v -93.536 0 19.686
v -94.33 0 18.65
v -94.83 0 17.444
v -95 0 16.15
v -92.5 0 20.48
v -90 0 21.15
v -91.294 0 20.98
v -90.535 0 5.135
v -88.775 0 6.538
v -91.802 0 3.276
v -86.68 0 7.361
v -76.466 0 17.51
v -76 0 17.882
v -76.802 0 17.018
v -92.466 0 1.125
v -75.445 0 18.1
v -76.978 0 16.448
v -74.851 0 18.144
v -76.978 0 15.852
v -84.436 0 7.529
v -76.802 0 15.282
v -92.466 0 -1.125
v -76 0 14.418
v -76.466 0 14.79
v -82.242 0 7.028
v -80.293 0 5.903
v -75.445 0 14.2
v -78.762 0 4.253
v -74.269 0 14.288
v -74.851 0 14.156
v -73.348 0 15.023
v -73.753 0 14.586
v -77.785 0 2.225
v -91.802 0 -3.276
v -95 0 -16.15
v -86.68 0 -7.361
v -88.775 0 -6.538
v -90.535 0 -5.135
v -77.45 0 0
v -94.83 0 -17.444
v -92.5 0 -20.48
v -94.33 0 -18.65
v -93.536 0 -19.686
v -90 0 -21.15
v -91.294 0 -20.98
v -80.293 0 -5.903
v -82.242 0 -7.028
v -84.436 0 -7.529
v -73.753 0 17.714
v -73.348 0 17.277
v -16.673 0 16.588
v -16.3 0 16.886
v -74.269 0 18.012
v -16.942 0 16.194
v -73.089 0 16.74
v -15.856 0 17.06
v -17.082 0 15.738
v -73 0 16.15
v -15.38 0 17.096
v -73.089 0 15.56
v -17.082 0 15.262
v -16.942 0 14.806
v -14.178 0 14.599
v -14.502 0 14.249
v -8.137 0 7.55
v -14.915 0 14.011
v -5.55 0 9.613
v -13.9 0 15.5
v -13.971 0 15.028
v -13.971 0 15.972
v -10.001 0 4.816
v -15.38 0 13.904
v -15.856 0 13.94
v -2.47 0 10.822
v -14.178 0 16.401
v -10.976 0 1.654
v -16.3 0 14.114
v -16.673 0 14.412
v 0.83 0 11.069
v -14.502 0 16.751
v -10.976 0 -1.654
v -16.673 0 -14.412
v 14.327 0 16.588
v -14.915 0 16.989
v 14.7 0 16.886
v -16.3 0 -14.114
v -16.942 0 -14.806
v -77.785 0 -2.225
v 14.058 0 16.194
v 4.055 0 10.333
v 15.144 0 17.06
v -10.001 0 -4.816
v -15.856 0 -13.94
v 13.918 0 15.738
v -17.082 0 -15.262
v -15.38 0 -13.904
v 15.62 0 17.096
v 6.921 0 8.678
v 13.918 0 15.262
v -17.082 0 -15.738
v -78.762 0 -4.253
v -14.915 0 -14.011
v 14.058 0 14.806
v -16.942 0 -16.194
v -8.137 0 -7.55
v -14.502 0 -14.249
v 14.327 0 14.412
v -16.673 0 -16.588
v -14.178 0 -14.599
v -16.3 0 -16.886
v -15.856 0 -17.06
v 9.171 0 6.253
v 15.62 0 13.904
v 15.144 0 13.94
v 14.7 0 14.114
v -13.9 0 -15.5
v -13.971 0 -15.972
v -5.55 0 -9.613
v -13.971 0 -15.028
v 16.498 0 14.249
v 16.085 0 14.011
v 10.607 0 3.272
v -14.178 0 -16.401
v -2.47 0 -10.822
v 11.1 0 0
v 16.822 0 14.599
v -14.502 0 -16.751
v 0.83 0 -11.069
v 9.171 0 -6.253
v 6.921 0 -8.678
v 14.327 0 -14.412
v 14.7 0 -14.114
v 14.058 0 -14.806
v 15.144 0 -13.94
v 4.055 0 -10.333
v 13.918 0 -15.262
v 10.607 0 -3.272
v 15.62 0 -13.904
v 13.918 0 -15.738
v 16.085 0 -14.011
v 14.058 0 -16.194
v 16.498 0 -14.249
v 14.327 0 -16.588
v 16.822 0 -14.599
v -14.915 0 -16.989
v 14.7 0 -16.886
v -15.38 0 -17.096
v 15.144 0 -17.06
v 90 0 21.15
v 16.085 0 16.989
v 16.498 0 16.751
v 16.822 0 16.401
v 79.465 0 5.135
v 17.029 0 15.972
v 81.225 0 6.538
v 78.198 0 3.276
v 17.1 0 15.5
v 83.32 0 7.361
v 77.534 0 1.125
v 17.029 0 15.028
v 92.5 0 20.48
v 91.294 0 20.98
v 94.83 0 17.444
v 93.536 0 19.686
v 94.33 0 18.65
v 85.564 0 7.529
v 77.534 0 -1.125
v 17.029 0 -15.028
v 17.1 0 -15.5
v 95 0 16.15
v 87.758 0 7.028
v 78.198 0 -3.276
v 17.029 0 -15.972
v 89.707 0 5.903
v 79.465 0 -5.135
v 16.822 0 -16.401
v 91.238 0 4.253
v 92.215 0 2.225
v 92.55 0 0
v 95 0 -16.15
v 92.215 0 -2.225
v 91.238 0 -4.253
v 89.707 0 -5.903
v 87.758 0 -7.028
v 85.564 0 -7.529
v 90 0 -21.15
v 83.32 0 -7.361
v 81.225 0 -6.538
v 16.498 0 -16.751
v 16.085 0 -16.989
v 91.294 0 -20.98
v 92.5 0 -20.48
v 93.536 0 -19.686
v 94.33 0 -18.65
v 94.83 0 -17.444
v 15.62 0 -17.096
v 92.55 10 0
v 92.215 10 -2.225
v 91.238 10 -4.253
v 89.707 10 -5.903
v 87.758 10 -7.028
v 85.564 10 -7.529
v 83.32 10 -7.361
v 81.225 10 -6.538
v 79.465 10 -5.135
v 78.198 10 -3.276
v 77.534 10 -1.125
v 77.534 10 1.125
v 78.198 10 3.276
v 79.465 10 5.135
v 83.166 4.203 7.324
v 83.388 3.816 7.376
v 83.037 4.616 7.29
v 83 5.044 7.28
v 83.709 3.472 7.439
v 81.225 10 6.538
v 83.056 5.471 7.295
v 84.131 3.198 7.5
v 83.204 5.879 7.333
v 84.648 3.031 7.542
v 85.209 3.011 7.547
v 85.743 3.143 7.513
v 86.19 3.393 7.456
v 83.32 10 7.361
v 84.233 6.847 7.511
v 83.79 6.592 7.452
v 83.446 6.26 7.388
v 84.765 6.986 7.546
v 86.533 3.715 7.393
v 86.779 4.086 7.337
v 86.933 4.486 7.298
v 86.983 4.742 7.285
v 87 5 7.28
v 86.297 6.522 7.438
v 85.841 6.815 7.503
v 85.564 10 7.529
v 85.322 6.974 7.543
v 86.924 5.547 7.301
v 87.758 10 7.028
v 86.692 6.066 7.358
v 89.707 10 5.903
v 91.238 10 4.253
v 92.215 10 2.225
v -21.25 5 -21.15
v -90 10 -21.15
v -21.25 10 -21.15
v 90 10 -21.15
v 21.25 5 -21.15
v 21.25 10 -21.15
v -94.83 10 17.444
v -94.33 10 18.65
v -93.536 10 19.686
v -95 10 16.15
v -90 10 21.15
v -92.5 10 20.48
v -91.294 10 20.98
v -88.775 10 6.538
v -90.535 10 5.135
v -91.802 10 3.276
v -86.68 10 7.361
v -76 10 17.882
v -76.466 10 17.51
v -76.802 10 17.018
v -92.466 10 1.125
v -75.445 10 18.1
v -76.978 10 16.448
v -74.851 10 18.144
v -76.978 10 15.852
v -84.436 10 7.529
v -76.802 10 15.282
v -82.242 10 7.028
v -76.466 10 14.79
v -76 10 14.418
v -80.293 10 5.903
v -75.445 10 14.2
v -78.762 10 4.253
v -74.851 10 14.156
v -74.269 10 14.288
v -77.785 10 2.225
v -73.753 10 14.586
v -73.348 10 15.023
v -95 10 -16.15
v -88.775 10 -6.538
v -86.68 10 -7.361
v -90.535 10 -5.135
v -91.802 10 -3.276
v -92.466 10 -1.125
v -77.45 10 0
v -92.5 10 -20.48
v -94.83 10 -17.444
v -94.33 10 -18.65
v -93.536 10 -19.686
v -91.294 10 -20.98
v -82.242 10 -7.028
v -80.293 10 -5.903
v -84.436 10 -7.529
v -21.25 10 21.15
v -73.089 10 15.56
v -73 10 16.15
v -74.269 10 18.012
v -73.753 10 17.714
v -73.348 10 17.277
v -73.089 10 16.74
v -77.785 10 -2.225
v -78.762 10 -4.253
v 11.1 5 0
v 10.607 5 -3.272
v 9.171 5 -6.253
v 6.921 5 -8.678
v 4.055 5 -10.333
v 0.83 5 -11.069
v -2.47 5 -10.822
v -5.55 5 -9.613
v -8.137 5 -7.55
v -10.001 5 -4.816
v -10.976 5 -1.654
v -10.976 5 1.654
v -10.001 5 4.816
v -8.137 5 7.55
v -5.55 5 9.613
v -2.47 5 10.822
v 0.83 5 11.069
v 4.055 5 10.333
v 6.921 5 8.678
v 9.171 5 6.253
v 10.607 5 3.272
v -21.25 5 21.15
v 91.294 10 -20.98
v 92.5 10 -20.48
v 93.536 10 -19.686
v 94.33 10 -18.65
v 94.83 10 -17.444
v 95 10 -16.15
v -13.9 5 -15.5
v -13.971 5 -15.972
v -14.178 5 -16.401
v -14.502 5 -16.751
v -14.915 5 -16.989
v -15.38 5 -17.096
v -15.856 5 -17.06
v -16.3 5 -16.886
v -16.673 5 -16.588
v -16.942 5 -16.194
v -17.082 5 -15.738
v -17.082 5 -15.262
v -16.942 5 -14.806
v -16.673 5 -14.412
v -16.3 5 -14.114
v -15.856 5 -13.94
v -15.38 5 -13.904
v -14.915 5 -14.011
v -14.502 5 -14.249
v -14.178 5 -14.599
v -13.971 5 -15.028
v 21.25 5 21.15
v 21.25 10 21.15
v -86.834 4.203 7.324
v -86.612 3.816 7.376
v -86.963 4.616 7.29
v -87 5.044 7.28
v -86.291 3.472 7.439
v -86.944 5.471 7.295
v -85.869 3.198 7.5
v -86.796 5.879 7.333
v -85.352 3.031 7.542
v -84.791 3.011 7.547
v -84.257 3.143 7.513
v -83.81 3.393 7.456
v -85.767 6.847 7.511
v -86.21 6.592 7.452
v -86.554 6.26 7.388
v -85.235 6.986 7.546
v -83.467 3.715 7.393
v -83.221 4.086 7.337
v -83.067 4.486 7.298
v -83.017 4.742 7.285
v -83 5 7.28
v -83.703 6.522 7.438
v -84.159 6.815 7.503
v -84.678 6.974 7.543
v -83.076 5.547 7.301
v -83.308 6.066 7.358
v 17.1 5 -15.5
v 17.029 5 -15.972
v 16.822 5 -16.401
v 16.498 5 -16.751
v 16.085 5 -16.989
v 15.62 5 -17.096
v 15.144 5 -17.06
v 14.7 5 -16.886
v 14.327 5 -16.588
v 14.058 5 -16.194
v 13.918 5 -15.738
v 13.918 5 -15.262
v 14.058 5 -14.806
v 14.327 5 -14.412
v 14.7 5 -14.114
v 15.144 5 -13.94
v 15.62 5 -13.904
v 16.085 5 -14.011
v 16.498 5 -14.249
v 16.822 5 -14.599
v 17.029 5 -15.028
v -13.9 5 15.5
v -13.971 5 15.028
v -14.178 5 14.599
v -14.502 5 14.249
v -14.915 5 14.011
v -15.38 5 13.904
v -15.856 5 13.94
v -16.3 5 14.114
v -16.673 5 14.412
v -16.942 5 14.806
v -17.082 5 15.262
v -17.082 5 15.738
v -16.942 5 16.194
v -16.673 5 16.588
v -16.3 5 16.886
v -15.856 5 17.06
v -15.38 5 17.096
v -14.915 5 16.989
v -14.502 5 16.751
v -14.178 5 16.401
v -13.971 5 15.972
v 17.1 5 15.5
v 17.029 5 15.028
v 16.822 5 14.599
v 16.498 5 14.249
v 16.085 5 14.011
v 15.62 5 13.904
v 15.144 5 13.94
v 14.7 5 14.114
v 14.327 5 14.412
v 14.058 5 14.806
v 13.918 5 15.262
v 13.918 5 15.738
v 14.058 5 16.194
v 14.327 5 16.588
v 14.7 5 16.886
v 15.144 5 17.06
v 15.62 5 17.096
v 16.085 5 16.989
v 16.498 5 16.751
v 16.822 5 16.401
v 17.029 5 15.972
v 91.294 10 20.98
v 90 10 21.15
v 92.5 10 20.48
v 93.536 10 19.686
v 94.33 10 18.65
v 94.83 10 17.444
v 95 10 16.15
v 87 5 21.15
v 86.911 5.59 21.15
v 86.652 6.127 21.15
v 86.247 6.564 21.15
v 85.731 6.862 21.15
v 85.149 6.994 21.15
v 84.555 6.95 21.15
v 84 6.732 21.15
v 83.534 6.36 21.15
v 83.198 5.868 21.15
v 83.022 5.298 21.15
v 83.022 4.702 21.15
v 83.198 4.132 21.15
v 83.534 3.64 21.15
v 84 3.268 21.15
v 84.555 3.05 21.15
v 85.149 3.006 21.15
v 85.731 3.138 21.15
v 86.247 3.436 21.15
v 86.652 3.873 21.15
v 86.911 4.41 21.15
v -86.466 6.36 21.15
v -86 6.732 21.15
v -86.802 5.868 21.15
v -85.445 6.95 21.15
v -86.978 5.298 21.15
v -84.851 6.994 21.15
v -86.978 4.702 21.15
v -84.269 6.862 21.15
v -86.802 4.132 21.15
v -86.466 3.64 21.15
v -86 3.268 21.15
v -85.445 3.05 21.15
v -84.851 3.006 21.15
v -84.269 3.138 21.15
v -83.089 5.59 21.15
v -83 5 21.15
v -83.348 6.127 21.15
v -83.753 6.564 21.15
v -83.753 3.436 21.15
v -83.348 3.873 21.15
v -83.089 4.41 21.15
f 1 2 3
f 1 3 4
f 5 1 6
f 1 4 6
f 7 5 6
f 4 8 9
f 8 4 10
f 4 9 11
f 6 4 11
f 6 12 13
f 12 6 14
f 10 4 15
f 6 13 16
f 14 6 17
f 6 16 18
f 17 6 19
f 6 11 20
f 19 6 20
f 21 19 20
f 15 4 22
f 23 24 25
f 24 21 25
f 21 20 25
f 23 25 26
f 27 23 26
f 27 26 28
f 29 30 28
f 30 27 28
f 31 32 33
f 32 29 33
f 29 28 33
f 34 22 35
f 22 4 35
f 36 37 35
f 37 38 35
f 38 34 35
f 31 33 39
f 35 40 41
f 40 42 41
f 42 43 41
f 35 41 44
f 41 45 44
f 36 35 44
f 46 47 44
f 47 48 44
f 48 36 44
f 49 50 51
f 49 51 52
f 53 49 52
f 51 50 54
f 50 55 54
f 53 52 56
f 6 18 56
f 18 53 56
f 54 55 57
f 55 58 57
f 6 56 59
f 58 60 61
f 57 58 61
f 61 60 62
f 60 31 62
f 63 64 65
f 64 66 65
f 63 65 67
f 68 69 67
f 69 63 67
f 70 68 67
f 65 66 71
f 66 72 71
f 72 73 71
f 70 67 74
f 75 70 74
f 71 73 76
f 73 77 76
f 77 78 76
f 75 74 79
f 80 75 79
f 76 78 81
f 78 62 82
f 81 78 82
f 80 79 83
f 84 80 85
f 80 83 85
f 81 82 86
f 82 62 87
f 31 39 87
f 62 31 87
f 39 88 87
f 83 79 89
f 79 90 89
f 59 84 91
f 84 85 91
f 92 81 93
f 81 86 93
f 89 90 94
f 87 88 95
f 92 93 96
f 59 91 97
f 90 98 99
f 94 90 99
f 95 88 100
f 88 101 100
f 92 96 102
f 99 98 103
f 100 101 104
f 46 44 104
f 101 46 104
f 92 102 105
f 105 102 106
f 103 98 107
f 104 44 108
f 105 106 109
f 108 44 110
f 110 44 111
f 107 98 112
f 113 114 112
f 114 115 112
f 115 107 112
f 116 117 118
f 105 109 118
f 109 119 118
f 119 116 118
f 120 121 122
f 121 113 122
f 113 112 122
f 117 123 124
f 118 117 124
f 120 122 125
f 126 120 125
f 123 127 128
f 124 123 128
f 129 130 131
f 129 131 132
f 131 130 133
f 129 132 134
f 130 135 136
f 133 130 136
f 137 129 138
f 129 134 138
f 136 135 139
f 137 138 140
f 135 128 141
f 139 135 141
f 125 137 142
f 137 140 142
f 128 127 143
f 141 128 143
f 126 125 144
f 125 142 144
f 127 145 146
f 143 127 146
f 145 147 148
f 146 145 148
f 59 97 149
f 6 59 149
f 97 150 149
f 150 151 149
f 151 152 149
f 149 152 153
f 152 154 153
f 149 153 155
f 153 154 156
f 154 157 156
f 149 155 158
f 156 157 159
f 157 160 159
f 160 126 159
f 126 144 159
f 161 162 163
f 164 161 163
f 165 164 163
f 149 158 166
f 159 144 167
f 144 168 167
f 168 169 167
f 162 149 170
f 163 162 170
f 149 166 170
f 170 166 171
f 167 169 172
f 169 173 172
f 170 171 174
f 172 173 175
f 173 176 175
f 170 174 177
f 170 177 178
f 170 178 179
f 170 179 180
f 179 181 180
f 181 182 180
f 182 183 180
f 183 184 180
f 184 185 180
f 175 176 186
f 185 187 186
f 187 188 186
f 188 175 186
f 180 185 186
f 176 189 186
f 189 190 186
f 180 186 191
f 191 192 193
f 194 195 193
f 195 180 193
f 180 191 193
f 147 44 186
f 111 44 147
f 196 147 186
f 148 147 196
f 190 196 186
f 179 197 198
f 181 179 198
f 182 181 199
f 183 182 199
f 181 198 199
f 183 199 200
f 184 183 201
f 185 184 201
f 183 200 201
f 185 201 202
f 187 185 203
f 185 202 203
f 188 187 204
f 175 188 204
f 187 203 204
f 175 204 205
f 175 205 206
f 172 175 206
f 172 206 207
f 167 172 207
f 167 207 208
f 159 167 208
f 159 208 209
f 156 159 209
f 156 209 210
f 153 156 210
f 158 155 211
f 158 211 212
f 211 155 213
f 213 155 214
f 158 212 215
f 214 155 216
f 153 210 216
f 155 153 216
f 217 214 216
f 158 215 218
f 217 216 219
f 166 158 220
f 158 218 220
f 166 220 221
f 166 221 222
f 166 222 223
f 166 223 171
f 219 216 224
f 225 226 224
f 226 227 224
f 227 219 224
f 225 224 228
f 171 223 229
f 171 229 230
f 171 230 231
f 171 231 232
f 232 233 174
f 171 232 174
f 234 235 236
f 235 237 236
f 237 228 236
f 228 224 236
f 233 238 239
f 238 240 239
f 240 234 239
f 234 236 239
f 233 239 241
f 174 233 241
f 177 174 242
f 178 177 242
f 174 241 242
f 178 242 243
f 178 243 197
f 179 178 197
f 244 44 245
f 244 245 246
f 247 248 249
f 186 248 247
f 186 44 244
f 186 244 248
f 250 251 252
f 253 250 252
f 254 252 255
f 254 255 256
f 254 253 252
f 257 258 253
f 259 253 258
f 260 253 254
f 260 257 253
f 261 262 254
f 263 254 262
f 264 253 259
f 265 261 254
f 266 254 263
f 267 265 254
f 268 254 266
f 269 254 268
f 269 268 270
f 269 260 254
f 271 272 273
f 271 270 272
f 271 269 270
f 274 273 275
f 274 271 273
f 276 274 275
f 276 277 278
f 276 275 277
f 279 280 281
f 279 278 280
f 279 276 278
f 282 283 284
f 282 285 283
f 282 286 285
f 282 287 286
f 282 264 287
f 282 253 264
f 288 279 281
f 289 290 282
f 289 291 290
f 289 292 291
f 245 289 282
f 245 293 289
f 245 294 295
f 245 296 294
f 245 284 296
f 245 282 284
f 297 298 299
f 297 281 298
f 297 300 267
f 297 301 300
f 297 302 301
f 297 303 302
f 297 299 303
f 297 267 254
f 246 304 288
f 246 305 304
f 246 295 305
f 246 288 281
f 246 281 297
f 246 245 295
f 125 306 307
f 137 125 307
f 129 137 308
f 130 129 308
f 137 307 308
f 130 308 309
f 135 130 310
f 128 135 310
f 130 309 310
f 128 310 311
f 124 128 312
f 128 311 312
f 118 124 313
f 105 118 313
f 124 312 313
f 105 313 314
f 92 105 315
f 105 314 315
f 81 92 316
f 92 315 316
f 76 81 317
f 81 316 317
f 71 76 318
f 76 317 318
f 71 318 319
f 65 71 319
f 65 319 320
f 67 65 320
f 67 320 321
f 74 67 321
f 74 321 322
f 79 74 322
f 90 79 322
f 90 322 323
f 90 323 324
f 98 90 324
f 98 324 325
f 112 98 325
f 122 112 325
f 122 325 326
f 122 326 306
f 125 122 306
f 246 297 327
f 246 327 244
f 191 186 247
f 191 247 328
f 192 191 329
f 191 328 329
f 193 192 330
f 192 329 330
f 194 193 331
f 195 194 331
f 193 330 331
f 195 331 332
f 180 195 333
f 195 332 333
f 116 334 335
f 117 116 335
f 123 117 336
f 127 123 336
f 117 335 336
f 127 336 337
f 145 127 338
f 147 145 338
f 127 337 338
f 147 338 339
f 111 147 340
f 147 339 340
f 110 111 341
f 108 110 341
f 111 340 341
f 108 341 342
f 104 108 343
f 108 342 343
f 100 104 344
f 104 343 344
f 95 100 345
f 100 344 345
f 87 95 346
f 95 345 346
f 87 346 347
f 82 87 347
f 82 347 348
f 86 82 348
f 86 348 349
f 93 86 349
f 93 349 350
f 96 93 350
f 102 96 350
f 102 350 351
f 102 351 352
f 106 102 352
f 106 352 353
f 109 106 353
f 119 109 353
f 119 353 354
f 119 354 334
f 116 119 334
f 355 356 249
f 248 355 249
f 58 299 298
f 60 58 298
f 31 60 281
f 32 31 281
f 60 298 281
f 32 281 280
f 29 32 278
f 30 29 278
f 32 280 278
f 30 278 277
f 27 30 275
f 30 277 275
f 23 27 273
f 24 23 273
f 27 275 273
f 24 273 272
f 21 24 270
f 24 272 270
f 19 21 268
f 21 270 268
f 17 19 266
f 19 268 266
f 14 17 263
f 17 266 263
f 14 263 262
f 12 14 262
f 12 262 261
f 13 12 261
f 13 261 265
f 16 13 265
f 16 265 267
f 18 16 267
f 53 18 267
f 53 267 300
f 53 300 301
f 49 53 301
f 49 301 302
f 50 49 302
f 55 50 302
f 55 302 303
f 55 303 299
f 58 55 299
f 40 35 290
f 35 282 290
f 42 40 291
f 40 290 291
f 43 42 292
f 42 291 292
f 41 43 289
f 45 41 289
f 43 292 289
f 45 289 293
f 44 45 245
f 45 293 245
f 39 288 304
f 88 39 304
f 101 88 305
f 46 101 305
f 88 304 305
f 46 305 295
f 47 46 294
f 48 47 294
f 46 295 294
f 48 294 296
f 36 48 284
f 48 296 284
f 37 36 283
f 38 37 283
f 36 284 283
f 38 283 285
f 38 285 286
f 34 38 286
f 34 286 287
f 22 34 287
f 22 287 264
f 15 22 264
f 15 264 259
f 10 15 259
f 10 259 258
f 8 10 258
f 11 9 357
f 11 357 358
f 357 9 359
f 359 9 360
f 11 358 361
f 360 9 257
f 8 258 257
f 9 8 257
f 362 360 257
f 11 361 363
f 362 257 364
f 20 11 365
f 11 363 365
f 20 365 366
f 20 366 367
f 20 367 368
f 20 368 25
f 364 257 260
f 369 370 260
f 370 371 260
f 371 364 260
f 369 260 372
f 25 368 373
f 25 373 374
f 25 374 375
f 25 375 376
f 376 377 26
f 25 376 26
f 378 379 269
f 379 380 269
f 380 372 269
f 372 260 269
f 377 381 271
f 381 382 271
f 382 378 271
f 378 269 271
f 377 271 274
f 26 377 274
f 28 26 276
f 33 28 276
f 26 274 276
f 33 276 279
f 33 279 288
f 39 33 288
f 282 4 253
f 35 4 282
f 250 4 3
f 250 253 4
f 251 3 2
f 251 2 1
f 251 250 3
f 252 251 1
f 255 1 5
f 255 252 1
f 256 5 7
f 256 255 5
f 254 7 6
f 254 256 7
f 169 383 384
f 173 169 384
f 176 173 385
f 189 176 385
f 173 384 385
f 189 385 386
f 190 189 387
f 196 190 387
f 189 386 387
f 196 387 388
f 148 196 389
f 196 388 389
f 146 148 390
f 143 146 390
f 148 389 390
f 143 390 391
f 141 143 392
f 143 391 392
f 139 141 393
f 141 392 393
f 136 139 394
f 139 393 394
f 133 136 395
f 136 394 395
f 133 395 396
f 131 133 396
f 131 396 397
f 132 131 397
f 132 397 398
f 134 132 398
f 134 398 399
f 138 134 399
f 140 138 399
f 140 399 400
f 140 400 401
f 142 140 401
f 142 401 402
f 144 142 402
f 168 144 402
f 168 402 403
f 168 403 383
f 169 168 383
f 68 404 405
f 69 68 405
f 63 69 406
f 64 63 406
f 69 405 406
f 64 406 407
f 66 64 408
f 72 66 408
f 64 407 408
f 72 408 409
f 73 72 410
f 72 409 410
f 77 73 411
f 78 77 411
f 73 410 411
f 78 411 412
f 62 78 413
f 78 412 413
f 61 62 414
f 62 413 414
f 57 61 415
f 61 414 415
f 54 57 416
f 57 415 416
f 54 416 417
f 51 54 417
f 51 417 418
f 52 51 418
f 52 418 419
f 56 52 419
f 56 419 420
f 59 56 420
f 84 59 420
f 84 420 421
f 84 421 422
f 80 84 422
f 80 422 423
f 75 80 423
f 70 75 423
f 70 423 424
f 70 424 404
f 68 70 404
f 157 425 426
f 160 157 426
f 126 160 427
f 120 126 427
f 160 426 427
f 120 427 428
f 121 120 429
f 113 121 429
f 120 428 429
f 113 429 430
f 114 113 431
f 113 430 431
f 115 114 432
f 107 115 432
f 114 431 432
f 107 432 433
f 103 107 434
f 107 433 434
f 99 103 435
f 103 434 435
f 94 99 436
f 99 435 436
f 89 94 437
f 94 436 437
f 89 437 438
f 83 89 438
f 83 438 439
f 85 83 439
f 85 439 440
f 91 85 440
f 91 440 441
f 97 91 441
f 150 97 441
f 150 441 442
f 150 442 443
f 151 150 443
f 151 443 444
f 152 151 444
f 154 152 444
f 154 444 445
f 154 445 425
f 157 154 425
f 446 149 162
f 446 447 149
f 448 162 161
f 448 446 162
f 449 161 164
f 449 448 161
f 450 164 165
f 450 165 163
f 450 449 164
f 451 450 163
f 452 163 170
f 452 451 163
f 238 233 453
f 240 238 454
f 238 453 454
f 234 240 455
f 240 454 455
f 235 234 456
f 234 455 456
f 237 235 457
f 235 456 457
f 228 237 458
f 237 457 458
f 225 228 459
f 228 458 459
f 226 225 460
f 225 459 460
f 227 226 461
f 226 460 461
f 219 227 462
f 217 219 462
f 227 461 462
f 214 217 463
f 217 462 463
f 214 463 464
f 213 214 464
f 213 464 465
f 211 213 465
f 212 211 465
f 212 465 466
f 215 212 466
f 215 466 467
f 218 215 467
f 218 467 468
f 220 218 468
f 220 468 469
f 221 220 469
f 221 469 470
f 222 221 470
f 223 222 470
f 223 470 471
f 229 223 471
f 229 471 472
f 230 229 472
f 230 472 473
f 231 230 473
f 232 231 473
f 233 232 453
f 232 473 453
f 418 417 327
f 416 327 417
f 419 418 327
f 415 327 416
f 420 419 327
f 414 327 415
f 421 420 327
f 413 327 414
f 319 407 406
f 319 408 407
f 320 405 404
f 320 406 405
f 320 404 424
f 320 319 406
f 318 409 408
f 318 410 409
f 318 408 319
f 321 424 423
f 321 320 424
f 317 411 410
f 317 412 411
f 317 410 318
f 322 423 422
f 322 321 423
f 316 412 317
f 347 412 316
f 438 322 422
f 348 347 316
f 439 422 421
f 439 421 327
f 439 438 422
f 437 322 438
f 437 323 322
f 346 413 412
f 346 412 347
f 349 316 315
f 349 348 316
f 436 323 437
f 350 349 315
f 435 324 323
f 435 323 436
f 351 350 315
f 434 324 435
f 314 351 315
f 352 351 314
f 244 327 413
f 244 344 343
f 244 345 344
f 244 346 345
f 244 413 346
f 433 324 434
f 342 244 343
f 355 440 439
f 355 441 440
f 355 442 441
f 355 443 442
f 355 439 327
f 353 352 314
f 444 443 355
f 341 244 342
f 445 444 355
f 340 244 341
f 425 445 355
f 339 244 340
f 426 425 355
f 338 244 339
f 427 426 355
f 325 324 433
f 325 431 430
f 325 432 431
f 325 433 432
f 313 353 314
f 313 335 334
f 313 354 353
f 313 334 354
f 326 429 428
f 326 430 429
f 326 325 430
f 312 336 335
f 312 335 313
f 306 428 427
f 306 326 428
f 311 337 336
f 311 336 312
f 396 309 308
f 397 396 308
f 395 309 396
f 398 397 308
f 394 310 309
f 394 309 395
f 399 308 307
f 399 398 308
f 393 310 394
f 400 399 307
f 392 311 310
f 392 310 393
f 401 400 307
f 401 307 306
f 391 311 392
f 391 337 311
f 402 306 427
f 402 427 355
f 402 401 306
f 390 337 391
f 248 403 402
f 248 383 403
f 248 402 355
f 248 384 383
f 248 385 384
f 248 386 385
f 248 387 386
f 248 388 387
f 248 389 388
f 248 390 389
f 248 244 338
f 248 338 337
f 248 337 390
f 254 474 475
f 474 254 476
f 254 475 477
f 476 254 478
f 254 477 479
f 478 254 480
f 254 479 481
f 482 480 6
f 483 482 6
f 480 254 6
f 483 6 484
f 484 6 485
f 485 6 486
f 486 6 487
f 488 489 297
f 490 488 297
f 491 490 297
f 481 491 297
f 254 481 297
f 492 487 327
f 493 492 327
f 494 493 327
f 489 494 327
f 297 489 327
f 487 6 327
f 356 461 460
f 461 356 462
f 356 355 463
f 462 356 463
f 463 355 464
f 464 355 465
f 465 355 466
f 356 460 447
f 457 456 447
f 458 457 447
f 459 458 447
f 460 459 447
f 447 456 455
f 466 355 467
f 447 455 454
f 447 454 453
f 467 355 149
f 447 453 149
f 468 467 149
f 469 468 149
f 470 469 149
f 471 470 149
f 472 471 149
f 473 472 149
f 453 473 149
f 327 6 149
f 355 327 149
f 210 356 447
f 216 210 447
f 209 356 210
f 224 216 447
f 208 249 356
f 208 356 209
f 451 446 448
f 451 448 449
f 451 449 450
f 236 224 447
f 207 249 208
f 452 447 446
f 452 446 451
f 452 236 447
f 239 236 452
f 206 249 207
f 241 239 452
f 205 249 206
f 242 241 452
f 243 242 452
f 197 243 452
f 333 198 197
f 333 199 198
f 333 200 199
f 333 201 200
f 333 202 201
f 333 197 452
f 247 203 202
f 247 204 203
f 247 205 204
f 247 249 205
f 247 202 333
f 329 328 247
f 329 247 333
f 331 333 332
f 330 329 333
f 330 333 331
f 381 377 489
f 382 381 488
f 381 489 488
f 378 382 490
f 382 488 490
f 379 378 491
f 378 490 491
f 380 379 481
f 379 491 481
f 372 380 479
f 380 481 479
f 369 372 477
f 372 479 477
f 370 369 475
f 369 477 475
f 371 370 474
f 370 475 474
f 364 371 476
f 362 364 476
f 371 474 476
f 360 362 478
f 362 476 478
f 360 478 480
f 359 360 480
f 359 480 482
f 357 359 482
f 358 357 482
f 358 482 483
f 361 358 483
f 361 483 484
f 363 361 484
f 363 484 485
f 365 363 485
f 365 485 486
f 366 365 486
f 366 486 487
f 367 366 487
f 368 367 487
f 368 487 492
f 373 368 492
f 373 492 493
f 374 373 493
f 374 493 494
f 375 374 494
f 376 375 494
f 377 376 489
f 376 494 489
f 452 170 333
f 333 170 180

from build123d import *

# Parameters (mm, degrees)
SKETCH_1_W          = 190
SKETCH_1_H          = 42.3
EXTRUDE_1_DEPTH     = 10
SKETCH_2_W          = 42.5
SKETCH_2_H          = 77.05305565
CUT_EXTRUDE_1_DEPTH = 5
SKETCH_3_R          = 1.6
SKETCH_3_R_2        = 11.1
CUT_EXTRUDE_2_DEPTH = 6
SKETCH_4_R          = 7.55
CUT_EXTRUDE_3_DEPTH = 11
FILLET_1_R          = 5
CUT_EXTRUDE_4_REACH = 44.3
SKETCH_5_R          = 2
SKETCH_6_R          = 2
CUT_EXTRUDE_5_DEPTH = 11.0000001


with BuildPart() as part:
    # 草图1 → 凸台-拉伸1 (new body)
    with BuildSketch(Plane(origin=(0, 0, 0), x_dir=(1, 0, 0), z_dir=(0, 1, 0))):
        Rectangle(SKETCH_1_W, SKETCH_1_H)
    extrude(amount=EXTRUDE_1_DEPTH)

    # 草图2 → 切除-拉伸1 (cut)
    with BuildSketch(Plane(origin=(0, 10, 0), x_dir=(1, 0, 0), z_dir=(0, 1, 0))):
        Rectangle(SKETCH_2_W, SKETCH_2_H)
    extrude(amount=-CUT_EXTRUDE_1_DEPTH, mode=Mode.SUBTRACT)

    # 草图3 → 切除-拉伸2 (cut, through all)
    with BuildSketch(Plane(origin=(0, 5, 0), x_dir=(1, 0, 0), z_dir=(0, 1, 0))):
        with Locations((-15.5, 15.5)):
            Circle(SKETCH_3_R)
        with Locations((15.5, 15.5)):
            Circle(SKETCH_3_R)
        with Locations((15.5, -15.5)):
            Circle(SKETCH_3_R)
        with Locations((-15.5, -15.5)):
            Circle(SKETCH_3_R)
        Circle(SKETCH_3_R_2)
    extrude(amount=-CUT_EXTRUDE_2_DEPTH, mode=Mode.SUBTRACT)

    # 草图4 → 切除-拉伸3 (cut, through all)
    with BuildSketch(Plane(origin=(0, 10, 0), x_dir=(1, 0, 0), z_dir=(0, 1, 0))):
        with Locations((-85, 0)):
            Circle(SKETCH_4_R)
        with Locations((85, 0)):
            Circle(SKETCH_4_R)
    extrude(amount=-CUT_EXTRUDE_3_DEPTH, mode=Mode.SUBTRACT)

    # 圆角1
    fillet_1_edges = [part.edges().sort_by_distance(p)[0] for p in [
        (95, 5, 21.15),
        (-95, 5, 21.15),
        (-95, 5, -21.15),
        (95, 5, -21.15),
    ]]
    fillet(fillet_1_edges, radius=FILLET_1_R)

    # 草图5 → 切除-拉伸4 (cut, up to next)
    with BuildSketch(Plane.XY.offset(21.15), mode=Mode.PRIVATE) as cut_extrude_4_sk1:
        with Locations((85, 5)):
            Circle(SKETCH_5_R)
    cut_extrude_4_tool1 = extrude(cut_extrude_4_sk1.sketch, amount=-CUT_EXTRUDE_4_REACH, mode=Mode.PRIVATE) & part.part
    add(cut_extrude_4_tool1.solids().sort_by_distance((85, 5, 21.15))[0], mode=Mode.SUBTRACT)
    # 草图5 → 切除-拉伸4 (cut, up to next)
    with BuildSketch(Plane.XY.offset(21.15), mode=Mode.PRIVATE) as cut_extrude_4_sk2:
        with Locations((-85, 5)):
            Circle(SKETCH_5_R)
    cut_extrude_4_tool2 = extrude(cut_extrude_4_sk2.sketch, amount=-CUT_EXTRUDE_4_REACH, mode=Mode.PRIVATE) & part.part
    add(cut_extrude_4_tool2.solids().sort_by_distance((-85, 5, 21.15))[0], mode=Mode.SUBTRACT)

    # 草图6 → 切除-拉伸5 (cut, through all)
    with BuildSketch(Plane(origin=(0, 10, 0), x_dir=(1, 0, 0), z_dir=(0, 1, 0))):
        with Locations((-75, -16.15)):
            Circle(SKETCH_6_R)
    extrude(amount=-CUT_EXTRUDE_5_DEPTH, mode=Mode.SUBTRACT)


solid = part.part
